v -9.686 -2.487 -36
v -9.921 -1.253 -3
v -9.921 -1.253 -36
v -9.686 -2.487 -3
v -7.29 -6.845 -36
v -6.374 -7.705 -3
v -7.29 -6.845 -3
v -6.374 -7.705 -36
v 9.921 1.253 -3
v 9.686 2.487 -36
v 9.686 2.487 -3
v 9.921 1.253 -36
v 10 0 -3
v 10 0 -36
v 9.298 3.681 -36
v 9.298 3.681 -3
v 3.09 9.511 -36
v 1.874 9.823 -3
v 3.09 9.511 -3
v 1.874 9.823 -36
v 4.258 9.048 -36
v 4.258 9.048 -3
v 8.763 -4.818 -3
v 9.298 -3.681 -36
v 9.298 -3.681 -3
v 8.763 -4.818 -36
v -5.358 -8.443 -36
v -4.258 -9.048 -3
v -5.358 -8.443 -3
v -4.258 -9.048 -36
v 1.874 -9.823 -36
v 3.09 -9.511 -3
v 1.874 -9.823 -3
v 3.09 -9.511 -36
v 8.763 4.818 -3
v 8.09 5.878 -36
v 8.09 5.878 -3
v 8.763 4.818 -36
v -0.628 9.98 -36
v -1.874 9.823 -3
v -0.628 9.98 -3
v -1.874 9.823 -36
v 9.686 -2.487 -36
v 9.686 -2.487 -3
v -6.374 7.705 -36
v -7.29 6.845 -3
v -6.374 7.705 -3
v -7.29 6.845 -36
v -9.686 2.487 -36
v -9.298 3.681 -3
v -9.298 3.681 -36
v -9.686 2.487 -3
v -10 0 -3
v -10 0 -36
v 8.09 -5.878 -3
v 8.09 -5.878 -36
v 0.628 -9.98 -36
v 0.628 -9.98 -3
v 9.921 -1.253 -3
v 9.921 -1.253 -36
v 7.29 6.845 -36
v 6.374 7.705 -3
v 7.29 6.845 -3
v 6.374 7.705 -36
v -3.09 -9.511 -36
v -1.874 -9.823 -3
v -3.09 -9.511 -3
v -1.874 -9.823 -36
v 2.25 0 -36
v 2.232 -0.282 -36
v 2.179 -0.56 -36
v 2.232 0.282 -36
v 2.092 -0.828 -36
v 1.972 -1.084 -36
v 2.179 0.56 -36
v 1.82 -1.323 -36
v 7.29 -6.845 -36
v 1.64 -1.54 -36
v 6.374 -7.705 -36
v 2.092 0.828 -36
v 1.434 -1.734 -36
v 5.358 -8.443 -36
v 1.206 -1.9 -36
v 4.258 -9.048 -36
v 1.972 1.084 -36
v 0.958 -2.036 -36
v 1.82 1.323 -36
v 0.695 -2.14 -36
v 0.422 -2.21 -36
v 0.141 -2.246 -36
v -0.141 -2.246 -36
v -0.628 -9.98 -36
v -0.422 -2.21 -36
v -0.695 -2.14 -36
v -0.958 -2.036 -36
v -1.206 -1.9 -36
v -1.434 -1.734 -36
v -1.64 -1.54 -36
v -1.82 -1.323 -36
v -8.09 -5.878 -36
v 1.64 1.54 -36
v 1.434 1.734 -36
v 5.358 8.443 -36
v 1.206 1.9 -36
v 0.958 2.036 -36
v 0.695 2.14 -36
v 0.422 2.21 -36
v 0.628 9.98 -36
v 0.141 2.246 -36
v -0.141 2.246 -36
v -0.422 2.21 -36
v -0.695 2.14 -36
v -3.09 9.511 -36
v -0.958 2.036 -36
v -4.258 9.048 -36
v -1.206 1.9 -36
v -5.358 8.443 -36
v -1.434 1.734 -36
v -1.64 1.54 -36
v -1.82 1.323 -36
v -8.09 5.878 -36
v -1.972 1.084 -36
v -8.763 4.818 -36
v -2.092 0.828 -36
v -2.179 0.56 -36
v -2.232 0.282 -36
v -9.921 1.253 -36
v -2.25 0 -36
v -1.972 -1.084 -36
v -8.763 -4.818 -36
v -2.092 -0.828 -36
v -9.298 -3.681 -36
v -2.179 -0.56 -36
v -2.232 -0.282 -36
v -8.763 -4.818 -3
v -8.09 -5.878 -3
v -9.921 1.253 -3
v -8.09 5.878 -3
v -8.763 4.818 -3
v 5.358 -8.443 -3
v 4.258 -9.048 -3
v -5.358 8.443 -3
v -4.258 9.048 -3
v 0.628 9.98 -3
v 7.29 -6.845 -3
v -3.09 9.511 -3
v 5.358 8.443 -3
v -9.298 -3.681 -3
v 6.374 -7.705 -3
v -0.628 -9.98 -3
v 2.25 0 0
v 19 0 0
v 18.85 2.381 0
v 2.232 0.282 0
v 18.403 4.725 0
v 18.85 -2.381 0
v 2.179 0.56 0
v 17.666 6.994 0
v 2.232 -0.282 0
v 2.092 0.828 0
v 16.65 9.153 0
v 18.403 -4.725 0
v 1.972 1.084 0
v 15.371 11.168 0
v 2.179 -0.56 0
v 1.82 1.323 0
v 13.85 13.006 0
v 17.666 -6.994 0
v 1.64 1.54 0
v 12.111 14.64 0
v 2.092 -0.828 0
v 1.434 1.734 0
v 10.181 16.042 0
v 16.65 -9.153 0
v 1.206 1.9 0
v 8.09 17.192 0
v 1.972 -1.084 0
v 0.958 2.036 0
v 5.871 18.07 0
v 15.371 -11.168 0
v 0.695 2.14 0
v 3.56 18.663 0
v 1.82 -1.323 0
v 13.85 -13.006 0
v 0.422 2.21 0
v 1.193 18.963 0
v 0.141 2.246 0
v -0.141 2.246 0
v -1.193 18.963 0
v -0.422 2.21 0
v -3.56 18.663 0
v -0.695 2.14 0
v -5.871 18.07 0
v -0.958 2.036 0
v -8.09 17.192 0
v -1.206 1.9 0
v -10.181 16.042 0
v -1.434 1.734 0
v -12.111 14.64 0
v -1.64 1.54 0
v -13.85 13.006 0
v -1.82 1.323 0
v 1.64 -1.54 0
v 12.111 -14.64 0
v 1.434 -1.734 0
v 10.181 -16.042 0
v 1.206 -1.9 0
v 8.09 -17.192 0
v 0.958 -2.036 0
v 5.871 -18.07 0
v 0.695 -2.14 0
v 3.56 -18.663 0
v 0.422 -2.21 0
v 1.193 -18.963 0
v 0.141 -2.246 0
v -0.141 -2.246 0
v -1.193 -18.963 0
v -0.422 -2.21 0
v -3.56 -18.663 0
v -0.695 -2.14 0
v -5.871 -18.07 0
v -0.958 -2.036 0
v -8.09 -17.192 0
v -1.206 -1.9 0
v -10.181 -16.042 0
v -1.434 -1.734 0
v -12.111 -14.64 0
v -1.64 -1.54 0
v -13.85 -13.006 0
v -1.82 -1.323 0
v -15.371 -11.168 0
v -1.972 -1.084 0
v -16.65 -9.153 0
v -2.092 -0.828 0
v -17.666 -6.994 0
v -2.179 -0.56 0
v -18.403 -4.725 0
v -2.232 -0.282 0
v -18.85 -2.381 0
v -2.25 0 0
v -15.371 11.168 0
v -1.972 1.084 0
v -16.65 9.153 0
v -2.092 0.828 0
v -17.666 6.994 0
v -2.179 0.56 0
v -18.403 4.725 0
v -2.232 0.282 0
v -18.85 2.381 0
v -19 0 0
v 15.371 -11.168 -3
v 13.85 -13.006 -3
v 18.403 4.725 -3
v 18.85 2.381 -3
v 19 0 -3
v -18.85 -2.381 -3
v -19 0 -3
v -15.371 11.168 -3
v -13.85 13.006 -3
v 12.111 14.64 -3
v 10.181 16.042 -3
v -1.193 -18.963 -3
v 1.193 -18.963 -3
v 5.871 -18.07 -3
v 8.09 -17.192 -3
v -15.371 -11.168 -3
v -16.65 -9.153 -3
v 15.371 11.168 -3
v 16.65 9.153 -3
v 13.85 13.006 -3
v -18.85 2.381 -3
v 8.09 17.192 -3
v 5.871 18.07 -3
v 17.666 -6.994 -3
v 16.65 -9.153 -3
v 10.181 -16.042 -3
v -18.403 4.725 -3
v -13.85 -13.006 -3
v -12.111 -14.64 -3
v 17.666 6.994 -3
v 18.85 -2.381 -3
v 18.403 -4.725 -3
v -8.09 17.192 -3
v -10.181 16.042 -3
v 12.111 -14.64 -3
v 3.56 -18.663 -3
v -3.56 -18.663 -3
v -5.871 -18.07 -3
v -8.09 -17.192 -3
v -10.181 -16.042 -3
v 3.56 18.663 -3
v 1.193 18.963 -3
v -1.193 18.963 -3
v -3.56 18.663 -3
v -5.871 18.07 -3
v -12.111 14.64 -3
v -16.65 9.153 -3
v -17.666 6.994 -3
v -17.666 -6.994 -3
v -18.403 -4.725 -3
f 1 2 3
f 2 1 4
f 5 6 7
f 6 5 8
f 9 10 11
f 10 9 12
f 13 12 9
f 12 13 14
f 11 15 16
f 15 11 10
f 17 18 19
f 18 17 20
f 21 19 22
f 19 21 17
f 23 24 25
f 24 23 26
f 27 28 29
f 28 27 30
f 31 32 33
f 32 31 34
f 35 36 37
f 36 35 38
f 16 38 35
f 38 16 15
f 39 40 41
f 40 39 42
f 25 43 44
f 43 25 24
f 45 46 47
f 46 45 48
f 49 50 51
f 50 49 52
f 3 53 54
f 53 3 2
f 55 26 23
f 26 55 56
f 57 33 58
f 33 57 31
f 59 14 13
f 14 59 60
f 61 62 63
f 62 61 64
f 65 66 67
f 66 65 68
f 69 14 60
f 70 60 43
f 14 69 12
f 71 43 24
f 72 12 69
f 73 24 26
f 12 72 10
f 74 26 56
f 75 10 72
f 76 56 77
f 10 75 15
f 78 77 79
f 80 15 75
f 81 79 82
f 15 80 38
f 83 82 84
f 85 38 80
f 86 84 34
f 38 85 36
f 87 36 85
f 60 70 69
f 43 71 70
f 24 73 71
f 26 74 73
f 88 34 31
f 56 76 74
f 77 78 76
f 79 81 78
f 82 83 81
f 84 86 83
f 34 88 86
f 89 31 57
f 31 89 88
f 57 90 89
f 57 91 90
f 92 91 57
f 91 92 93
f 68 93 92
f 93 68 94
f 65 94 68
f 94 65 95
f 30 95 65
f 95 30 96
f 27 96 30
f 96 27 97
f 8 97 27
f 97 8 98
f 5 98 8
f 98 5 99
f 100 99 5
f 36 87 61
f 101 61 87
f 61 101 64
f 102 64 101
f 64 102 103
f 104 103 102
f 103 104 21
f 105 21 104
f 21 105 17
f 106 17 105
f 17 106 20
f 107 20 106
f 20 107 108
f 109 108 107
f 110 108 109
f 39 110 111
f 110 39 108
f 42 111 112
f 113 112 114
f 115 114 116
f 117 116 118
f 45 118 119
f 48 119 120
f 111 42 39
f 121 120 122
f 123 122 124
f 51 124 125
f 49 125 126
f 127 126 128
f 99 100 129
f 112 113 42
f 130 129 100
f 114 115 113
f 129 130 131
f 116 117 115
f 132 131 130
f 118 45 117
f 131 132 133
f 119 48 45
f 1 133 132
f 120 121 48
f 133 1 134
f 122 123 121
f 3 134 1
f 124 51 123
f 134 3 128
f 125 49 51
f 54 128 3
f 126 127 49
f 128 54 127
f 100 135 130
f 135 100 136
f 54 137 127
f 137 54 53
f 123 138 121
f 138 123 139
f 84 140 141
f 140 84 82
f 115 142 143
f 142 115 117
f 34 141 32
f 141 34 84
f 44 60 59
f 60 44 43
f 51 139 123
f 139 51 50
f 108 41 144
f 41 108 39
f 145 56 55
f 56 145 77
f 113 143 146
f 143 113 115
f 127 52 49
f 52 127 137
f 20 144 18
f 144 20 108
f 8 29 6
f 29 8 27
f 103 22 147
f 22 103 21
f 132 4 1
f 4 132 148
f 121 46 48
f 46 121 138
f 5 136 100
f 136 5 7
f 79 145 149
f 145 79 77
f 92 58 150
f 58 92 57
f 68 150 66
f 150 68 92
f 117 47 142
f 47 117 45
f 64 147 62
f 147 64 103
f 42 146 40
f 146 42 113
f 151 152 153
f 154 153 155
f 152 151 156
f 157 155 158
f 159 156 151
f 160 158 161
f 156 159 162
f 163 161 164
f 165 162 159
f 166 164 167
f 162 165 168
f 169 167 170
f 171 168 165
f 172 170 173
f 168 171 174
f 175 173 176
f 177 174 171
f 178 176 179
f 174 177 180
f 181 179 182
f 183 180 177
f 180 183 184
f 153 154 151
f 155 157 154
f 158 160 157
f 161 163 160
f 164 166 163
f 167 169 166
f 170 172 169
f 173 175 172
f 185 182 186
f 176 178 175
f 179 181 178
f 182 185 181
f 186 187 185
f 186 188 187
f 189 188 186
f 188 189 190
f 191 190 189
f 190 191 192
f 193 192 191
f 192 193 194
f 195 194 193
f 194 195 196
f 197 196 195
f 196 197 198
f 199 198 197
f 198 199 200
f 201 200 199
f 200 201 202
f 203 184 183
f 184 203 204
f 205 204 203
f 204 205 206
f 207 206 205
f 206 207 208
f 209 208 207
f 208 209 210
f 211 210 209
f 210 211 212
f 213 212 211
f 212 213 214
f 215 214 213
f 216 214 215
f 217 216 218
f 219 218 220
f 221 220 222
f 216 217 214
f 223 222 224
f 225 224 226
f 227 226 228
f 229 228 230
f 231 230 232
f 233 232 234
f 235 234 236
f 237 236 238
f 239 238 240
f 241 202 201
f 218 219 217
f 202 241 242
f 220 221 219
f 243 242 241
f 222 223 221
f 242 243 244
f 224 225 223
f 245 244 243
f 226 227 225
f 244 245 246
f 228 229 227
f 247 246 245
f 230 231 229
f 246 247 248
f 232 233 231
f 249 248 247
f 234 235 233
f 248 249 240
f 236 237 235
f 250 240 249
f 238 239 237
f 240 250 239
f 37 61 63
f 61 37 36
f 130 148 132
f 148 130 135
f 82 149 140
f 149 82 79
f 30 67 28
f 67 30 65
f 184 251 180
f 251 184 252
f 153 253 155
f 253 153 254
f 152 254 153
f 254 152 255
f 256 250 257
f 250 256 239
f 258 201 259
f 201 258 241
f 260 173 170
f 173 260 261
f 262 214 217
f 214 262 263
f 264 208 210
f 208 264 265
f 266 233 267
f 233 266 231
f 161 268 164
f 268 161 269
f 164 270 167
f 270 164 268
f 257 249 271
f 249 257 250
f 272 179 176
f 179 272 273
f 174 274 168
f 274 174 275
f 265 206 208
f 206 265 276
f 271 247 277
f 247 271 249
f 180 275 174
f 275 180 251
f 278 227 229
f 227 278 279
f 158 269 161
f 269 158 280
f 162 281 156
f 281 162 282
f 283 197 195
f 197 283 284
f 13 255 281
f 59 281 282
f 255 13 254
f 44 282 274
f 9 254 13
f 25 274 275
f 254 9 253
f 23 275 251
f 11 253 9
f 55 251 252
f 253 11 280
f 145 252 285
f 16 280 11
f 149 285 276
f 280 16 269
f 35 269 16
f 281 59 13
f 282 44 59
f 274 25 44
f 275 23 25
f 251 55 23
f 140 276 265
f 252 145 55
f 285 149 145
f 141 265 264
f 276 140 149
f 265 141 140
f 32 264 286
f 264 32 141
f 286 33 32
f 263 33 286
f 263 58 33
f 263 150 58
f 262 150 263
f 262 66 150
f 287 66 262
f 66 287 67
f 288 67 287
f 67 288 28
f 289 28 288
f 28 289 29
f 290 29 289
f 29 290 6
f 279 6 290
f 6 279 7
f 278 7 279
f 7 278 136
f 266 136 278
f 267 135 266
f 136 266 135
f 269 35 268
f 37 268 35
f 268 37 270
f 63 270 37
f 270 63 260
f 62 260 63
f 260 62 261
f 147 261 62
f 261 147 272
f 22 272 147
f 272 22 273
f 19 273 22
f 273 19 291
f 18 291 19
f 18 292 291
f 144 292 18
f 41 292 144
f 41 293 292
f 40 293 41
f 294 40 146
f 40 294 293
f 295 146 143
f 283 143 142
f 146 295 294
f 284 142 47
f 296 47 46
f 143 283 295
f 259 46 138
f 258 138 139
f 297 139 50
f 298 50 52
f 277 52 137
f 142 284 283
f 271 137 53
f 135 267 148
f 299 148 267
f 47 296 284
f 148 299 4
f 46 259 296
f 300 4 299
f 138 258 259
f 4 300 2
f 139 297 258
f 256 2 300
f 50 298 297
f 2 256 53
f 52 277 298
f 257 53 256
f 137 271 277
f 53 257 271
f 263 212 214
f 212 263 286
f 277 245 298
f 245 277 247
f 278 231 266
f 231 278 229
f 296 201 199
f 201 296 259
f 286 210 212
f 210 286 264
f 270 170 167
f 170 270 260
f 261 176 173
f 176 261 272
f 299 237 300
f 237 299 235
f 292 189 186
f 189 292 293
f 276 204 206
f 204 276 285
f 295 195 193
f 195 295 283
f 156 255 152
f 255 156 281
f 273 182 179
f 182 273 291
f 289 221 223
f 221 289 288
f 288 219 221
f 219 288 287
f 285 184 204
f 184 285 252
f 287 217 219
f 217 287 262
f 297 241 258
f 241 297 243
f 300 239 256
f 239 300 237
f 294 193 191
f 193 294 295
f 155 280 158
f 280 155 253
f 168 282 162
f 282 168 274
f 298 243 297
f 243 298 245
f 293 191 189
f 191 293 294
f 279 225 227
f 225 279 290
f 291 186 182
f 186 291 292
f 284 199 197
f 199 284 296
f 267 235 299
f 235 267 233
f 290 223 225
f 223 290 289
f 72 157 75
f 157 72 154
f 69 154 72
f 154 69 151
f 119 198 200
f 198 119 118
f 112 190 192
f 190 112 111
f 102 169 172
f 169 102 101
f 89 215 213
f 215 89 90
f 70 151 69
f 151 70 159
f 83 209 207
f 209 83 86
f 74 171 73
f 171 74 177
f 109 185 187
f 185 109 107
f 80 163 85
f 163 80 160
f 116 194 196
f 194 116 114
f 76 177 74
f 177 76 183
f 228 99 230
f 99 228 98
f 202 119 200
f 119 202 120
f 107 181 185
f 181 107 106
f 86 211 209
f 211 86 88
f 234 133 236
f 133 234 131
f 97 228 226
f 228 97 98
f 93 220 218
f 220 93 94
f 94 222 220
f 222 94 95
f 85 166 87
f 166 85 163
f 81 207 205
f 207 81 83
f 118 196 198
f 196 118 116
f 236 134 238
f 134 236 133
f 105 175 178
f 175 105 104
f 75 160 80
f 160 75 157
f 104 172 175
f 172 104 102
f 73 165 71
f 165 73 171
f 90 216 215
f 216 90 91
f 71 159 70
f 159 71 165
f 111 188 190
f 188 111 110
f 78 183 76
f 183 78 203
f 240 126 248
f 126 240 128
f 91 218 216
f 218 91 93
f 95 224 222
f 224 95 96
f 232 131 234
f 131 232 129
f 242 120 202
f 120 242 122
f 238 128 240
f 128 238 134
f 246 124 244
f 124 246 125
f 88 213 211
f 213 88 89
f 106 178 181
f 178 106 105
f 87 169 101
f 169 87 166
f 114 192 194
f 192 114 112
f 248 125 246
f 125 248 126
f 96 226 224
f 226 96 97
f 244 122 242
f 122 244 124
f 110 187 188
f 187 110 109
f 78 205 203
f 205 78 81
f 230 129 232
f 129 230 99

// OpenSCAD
$fn = 50;


difference() {
	union() {
		translate(v = [0, 0, -36.0000000000]) {
			cylinder(h = 36, r = 10.0000000000);
		}
		translate(v = [0, 0, -3.0000000000]) {
			cylinder(h = 3, r = 19.0000000000);
		}
	}
	union() {
		#translate(v = [0, 0, -36]) {
			cylinder(h = 36, r = 2.2500000000);
		}
	}
}
